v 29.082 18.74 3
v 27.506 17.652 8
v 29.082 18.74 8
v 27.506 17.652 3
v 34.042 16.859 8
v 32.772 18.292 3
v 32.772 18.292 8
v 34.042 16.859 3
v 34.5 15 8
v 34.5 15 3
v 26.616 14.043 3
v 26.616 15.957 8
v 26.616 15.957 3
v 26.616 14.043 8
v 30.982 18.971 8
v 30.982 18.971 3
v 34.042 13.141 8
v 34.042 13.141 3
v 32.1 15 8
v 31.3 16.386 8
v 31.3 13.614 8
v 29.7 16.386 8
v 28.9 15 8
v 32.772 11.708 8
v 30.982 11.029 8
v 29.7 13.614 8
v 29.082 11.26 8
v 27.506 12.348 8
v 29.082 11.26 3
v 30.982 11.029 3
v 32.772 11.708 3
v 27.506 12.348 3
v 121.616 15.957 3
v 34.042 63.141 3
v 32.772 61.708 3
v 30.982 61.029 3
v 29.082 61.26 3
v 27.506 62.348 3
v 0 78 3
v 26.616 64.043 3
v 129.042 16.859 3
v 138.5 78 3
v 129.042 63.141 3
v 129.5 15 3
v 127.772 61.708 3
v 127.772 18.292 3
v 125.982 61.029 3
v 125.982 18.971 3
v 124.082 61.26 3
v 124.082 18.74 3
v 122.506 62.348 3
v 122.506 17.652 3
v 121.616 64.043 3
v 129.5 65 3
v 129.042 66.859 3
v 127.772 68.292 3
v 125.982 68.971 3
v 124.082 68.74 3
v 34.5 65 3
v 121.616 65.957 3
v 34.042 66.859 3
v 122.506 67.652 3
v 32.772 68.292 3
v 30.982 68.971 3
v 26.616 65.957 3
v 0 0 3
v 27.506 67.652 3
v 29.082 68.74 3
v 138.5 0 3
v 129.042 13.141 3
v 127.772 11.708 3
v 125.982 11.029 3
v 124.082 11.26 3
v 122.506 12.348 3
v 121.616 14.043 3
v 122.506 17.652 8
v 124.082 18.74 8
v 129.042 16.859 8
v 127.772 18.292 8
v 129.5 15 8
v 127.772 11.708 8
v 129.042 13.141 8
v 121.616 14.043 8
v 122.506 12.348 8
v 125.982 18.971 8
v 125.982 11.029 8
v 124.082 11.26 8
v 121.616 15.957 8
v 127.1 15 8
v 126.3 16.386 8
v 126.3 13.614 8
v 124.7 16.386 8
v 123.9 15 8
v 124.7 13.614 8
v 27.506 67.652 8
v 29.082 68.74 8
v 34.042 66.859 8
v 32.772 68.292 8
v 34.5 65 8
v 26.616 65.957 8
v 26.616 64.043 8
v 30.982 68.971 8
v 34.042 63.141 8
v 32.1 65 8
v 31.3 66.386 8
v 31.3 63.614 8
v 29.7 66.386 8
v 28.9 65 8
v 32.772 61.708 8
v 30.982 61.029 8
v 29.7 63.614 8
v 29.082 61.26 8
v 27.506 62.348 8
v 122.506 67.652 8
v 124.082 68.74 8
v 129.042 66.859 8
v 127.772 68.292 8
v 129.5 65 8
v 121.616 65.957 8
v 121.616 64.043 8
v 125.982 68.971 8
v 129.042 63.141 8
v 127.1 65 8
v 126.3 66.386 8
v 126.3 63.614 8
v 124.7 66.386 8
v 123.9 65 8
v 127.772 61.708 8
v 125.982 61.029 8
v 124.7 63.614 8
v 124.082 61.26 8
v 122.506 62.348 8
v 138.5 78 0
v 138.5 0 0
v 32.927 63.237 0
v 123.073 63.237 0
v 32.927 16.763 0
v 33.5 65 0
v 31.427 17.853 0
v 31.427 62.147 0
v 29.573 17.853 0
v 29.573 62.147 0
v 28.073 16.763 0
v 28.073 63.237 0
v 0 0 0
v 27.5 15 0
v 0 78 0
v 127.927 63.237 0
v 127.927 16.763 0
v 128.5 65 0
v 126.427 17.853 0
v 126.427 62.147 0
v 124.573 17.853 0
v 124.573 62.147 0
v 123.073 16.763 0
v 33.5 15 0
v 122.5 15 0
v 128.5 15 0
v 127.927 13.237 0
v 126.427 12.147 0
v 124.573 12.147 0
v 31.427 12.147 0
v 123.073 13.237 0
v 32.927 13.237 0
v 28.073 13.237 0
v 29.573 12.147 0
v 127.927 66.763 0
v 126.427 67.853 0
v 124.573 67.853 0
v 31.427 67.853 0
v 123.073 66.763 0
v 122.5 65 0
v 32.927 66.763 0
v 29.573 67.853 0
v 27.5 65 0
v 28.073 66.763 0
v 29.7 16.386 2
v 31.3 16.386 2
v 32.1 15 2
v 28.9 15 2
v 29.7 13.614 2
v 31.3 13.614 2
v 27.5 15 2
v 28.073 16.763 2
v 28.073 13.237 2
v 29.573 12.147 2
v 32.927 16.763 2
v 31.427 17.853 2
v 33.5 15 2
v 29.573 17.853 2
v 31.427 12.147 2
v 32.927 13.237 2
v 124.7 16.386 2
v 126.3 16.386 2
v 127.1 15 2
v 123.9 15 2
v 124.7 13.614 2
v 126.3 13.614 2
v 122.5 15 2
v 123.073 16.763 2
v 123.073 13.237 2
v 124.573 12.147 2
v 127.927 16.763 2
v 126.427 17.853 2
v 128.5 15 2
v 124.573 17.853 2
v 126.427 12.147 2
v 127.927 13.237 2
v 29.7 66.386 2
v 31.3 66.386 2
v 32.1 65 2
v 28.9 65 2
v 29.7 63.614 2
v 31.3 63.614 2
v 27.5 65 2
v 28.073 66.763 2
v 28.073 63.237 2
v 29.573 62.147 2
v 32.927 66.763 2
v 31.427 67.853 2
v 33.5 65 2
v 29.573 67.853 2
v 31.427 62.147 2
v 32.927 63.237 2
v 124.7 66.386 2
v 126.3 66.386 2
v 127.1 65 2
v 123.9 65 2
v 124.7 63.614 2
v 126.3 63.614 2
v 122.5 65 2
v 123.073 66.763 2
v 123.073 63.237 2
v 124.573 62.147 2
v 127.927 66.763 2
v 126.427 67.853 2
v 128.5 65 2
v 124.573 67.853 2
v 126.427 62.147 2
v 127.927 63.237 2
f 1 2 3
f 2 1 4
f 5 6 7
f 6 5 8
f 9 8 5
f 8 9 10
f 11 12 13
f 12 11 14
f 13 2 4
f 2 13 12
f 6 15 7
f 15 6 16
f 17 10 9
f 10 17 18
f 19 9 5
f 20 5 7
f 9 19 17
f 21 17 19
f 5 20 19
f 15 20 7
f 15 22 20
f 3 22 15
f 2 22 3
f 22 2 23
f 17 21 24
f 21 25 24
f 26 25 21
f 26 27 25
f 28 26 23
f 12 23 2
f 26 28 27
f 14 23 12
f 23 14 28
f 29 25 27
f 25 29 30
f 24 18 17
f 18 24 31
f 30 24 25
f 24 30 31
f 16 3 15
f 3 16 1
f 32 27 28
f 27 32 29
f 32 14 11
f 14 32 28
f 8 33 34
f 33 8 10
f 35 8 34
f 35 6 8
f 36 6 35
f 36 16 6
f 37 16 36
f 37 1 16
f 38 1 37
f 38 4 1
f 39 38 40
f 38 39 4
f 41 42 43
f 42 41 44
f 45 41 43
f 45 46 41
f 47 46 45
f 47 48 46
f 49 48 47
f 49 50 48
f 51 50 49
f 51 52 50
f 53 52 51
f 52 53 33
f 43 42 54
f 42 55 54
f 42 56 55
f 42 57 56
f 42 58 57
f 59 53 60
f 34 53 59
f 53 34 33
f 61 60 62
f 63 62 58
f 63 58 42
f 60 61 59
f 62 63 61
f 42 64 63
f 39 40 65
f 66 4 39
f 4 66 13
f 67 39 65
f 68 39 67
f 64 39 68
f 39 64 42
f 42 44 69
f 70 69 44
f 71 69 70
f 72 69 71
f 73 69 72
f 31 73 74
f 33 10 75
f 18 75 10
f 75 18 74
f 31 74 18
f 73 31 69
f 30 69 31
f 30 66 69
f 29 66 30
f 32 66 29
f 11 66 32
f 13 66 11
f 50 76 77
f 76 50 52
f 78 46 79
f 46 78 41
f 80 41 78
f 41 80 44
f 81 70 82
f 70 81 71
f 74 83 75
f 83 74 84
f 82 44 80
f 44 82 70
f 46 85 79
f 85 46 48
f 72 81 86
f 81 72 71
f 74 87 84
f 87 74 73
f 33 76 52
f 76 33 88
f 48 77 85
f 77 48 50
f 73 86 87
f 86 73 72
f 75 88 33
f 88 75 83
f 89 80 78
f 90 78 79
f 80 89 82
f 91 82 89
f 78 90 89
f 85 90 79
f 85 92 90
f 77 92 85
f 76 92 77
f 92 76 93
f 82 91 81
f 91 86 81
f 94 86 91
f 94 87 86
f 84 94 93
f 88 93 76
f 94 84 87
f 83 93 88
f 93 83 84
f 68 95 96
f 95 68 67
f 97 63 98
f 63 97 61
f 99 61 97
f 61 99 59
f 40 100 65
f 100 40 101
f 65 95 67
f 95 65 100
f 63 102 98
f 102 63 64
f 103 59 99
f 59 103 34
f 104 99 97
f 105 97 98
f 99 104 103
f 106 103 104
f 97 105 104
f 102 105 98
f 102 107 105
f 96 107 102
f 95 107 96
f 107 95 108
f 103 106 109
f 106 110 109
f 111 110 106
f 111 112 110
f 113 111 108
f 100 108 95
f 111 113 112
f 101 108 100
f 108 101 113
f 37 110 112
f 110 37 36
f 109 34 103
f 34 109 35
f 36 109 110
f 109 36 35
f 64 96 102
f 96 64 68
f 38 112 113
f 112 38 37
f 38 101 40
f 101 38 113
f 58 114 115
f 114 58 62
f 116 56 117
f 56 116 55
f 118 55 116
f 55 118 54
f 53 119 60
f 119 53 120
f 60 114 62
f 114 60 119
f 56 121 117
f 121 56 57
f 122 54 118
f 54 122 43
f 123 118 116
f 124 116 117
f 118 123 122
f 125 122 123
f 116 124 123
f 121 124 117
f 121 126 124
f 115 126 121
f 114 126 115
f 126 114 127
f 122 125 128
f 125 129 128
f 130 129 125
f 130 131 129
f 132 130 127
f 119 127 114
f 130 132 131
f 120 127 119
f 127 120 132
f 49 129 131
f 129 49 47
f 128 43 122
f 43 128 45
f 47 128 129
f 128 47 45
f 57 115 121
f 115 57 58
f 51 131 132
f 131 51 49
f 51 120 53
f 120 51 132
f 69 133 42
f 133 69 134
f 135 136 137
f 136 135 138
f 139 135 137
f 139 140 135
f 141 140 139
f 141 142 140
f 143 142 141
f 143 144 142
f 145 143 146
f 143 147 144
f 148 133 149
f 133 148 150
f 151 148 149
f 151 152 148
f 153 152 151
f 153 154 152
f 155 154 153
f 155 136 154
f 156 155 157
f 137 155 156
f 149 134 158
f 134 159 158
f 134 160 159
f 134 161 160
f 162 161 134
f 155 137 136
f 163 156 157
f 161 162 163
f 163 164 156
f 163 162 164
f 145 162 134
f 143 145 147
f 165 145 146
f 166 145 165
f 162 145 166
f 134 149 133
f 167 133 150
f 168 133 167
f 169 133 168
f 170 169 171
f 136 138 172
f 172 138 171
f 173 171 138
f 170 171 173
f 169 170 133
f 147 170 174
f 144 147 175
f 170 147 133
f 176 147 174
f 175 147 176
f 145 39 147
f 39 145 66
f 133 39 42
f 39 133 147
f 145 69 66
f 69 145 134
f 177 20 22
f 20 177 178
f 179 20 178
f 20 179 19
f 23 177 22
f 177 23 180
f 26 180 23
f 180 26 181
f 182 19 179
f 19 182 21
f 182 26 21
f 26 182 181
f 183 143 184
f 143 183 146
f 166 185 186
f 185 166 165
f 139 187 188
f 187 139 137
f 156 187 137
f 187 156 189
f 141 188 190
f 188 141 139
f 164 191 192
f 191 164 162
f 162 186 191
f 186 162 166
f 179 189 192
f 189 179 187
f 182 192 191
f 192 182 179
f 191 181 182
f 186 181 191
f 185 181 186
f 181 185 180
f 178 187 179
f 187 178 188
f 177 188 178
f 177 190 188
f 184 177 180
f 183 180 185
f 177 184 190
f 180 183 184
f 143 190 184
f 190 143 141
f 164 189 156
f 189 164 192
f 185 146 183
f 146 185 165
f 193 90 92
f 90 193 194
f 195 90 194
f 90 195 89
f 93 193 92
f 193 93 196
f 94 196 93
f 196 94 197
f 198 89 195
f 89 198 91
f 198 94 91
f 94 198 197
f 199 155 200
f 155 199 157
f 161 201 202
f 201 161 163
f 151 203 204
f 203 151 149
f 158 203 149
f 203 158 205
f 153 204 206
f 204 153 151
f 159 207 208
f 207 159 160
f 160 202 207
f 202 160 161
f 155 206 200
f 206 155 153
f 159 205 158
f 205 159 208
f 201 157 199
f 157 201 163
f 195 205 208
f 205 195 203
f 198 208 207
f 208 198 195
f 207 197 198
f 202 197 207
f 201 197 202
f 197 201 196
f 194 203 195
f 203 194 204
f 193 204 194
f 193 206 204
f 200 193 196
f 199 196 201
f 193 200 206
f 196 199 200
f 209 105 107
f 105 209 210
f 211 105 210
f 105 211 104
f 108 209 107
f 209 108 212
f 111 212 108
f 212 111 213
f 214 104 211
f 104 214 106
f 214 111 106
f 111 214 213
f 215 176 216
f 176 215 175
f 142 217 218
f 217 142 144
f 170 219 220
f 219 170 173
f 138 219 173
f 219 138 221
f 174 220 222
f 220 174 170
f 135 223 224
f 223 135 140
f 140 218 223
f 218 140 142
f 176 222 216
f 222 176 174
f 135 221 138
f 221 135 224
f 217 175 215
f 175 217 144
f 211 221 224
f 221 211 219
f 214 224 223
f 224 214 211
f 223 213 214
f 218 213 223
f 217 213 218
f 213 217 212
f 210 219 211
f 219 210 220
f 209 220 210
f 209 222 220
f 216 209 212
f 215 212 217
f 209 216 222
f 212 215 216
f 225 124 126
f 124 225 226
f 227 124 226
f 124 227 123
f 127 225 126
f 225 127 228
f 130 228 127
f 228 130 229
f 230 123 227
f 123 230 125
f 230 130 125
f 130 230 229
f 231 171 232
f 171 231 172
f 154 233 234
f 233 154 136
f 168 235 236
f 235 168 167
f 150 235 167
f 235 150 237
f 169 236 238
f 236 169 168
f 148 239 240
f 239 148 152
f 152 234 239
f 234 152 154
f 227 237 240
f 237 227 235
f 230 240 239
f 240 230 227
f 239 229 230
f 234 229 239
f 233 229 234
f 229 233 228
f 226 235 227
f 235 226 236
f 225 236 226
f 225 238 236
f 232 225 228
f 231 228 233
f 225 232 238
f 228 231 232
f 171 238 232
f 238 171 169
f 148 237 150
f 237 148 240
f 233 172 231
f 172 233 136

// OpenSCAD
// PCB holder for epdiy case
// Based on specifications from instructions.md

// PCB dimensions
pcb_width = 97;
pcb_height = 55;
pcb_thickness = 1.6; // Standard PCB thickness

// Mounting hole positions (relative to PCB origin)
mounting_holes = [
    [27.5, 12],
    [122.5, 12], 
    [27.5, 62],
    [122.5, 62]
];

// Calculate holder dimensions to encompass all mounting holes
max_hole_x = 122.5;
max_hole_y = 62;
holder_width = max_hole_x + 10; // Add margin beyond furthest hole
holder_height = max_hole_y + 10; // Add margin beyond furthest hole

// Holder parameters
wall_thickness = 3;
screw_hole_diameter = 3.2; // M3 screws
screw_head_diameter = 6;
screw_head_depth = 2;
standoff_height = 5;

module pcb_holder() {
    difference() {
        union() {
            // Base plate sized to encompass all mounting holes
            cube([holder_width + 2*wall_thickness, holder_height + 2*wall_thickness, wall_thickness]);
            
            // Standoffs for mounting screws
            for (hole = mounting_holes) {
                translate([wall_thickness + hole[0], wall_thickness + hole[1], wall_thickness])
                    cylinder(h = standoff_height, d = screw_head_diameter + 2);
            }
        }
        
        // Screw holes through standoffs
        for (hole = mounting_holes) {
            translate([wall_thickness + hole[0], wall_thickness + hole[1], -1])
                cylinder(h = wall_thickness + standoff_height + 2, d = screw_hole_diameter);
            
            // Countersink for screw heads (from bottom)
            translate([wall_thickness + hole[0], wall_thickness + hole[1], -1])
                cylinder(h = screw_head_depth + 1, d = screw_head_diameter);
        }
    }
}

pcb_holder();
